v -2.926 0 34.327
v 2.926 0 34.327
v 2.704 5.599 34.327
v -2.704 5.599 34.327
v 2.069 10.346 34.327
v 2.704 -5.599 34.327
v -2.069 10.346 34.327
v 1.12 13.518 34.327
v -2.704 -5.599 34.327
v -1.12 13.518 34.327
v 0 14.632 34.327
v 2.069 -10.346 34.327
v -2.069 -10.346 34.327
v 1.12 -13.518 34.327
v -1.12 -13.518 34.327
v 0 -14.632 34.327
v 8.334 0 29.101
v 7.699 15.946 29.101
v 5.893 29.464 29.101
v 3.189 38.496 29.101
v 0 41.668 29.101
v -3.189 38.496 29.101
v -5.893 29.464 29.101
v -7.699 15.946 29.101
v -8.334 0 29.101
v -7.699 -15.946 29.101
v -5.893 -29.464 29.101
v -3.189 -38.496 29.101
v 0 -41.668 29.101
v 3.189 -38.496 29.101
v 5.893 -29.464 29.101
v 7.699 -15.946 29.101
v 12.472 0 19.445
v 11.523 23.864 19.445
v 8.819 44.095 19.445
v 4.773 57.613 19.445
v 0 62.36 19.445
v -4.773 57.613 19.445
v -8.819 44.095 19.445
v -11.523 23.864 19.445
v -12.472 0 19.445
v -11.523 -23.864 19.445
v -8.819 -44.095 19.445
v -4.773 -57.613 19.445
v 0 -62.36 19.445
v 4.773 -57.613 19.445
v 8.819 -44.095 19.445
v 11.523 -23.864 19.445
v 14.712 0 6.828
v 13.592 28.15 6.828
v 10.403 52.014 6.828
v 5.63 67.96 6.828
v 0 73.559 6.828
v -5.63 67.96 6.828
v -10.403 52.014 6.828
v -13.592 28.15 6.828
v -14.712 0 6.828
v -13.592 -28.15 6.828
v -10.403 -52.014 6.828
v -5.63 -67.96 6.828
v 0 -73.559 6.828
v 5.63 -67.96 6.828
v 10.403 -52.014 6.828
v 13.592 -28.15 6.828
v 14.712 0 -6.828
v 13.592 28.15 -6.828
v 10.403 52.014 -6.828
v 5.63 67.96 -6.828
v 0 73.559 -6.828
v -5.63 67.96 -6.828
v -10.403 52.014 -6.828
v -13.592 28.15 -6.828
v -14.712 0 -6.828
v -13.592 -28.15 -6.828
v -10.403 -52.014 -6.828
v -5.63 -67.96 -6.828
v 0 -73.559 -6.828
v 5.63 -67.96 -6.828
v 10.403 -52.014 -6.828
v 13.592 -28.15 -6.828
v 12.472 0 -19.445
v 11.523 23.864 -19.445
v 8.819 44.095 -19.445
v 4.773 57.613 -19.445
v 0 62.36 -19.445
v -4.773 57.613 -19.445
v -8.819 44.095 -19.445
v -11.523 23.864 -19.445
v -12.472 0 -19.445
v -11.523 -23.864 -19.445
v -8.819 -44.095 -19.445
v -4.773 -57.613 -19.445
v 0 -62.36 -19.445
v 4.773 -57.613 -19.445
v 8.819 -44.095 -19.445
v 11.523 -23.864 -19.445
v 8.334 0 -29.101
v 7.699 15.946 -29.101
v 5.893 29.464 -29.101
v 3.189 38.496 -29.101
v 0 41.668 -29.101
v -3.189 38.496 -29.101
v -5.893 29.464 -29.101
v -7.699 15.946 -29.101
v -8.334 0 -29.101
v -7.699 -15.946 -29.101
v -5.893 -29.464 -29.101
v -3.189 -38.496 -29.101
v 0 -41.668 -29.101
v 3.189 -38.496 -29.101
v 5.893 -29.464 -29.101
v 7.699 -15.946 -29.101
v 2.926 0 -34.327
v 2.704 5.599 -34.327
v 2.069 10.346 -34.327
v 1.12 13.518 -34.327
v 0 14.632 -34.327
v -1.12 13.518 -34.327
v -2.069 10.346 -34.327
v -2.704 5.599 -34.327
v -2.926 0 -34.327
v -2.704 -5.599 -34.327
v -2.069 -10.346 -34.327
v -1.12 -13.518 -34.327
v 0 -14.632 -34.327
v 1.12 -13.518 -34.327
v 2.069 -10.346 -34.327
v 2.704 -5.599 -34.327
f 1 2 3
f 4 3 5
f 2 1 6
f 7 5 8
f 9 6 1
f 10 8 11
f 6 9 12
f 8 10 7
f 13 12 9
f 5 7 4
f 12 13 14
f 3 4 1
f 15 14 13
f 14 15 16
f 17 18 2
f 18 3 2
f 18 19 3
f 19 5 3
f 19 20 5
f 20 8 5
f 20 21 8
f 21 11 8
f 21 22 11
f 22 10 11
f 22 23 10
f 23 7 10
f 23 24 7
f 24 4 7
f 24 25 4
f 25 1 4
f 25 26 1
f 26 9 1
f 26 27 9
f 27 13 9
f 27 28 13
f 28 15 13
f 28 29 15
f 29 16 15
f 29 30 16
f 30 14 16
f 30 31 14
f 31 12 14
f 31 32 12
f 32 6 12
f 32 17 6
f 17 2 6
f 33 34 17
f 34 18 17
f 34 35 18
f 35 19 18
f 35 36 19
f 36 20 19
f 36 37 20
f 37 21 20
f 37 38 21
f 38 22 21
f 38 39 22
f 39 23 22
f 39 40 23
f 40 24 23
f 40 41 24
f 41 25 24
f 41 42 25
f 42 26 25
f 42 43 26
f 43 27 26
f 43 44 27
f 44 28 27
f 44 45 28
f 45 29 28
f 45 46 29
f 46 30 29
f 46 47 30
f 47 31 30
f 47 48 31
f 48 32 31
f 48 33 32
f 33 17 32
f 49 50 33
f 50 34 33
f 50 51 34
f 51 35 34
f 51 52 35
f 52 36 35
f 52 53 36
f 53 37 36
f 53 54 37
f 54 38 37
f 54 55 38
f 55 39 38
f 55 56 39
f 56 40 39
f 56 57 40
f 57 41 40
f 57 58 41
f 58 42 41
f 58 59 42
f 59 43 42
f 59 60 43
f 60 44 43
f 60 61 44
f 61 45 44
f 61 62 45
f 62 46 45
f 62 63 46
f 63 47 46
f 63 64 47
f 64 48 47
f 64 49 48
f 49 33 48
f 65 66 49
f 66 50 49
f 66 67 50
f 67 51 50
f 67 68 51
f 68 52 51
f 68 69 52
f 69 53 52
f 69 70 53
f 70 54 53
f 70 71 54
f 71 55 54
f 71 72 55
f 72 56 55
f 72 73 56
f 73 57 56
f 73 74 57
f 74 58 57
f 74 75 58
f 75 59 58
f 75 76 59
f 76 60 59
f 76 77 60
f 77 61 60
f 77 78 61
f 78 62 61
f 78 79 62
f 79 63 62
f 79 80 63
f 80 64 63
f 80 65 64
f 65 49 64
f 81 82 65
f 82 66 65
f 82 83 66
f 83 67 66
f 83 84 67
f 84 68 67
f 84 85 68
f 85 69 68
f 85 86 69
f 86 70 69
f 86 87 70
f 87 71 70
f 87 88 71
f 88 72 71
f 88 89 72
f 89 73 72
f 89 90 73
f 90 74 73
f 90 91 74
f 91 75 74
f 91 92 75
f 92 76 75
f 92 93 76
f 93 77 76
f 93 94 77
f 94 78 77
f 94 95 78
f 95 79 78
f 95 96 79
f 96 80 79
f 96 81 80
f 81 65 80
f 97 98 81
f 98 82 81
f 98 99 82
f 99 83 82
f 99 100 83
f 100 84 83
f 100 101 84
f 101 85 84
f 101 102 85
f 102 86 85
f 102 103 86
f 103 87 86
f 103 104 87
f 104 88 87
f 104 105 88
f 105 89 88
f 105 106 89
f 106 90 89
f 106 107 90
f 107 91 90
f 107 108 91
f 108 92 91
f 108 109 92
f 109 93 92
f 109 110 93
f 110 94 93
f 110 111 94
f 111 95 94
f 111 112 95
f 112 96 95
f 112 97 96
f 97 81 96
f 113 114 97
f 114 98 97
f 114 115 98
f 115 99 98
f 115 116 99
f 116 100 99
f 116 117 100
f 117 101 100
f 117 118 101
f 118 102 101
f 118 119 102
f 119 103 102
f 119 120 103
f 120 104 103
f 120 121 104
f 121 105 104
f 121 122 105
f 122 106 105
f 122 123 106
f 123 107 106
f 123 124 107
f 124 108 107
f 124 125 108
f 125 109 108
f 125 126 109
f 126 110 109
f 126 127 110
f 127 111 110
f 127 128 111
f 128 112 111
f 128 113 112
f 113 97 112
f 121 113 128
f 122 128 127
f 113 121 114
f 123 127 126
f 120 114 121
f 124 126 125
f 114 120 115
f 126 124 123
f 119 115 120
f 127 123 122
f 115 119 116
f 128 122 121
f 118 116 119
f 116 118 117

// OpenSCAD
// Generated by SolidPython 1.0.1 on 2020-07-29 00:46:45


scale(v = [3, 15, 7]) {
	sphere(r = 5);
}
/***********************************************
*********      SolidPython code:      **********
************************************************
 
# import packages: SolidPython
from solid import *
from solid.utils import *
from itertools import chain, combinations, permutations


class Resize:

    def __init__(self, scad_file):
        self.scad_file = scad_file
        #self.scad_file = import_scad(scad_file)
        # cone/cylinder param:
        self.r1 = 0
        self.r2 = 0
        self.h = 0
        # rectangular prism param:
        self.w = 0
        self.l = 0
        # ellipse param:
        self.r = 0

    # import OpenScad code (file name corresponds to shape)


    # classify shape + parameters
    def assign(self, param1, param2, param3):
        if self.scad_file == 'cone.scad':
            self.r1 = param1
            self.r2 = param2
            self.h = param3
        elif self.scad_file == 'cylinder.scad':
            self.r1 = param1
            self.r2 = param2
            self.h = param3
        elif self.scad_file == 'rectangularPrism.scad':
            self.h = param1
            self.l = param2
            self.w = param3
        else:
            self.r = param1
            self.h = param2

    # resize parameters
    def iterate(self):
        x = range(3, 20, 2)
        i = 1
        if self.scad_file == 'cone.scad':
            tempList = list(permutations(x, 2))
            for temp in tempList:
                param1 = temp[0]
                param2 = temp[1]
                filepath = 'produced_scad_files/' + 'cone' + str(param1) + '_' + str(param2) + '_' + '.scad'
                scad_render_to_file(cylinder(h=param1, r1=param2, r2=0), filepath)

        elif self.scad_file == 'cylinder.scad':
            tempList = list(permutations(x, 3))
            for temp in tempList:
                param1 = temp[0]
                param2 = temp[1]
                filepath = 'produced_scad_files/' + 'cylinder' + str(param1) + '_' + str(param2) + '_' + '.scad'
                scad_render_to_file(cylinder(h=param1, r1=param2, r2=param2), filepath)

        elif self.scad_file == 'rectangularPrism.scad':
            tempList = list(permutations(x, 3))
            for temp in tempList:
                param1 = temp[0]
                param2 = temp[1]
                param3 = temp[2]
                filepath = 'produced_scad_files/' + 'rectangularPrism' + str(param1) + '_' + str(param2) + '_' + str(
                    param3) + '.scad'
                scad_render_to_file(cube(size=(param1, param2, param3)), filepath)

        elif self.scad_file == 'ellipse.scad':
            tempList = list(permutations(x, 4))
            for temp in tempList:
                param1 = temp[0]
                param2 = temp[1]
                param3 = temp[2]
                param4 = temp[3]
                filepath = 'produced_scad_files/' + 'ellipse' + str(param1) + '_' + str(param2) + '_' + str(param3) + '_' + str(param4) + '.scad'
                scad_render_to_file(scale([param1, param2, param3])(sphere(r=param4)), filepath)

    def render_to_scadfile(self):
        scad_render_to_file(scad, 'example.scad') 
 
************************************************/
